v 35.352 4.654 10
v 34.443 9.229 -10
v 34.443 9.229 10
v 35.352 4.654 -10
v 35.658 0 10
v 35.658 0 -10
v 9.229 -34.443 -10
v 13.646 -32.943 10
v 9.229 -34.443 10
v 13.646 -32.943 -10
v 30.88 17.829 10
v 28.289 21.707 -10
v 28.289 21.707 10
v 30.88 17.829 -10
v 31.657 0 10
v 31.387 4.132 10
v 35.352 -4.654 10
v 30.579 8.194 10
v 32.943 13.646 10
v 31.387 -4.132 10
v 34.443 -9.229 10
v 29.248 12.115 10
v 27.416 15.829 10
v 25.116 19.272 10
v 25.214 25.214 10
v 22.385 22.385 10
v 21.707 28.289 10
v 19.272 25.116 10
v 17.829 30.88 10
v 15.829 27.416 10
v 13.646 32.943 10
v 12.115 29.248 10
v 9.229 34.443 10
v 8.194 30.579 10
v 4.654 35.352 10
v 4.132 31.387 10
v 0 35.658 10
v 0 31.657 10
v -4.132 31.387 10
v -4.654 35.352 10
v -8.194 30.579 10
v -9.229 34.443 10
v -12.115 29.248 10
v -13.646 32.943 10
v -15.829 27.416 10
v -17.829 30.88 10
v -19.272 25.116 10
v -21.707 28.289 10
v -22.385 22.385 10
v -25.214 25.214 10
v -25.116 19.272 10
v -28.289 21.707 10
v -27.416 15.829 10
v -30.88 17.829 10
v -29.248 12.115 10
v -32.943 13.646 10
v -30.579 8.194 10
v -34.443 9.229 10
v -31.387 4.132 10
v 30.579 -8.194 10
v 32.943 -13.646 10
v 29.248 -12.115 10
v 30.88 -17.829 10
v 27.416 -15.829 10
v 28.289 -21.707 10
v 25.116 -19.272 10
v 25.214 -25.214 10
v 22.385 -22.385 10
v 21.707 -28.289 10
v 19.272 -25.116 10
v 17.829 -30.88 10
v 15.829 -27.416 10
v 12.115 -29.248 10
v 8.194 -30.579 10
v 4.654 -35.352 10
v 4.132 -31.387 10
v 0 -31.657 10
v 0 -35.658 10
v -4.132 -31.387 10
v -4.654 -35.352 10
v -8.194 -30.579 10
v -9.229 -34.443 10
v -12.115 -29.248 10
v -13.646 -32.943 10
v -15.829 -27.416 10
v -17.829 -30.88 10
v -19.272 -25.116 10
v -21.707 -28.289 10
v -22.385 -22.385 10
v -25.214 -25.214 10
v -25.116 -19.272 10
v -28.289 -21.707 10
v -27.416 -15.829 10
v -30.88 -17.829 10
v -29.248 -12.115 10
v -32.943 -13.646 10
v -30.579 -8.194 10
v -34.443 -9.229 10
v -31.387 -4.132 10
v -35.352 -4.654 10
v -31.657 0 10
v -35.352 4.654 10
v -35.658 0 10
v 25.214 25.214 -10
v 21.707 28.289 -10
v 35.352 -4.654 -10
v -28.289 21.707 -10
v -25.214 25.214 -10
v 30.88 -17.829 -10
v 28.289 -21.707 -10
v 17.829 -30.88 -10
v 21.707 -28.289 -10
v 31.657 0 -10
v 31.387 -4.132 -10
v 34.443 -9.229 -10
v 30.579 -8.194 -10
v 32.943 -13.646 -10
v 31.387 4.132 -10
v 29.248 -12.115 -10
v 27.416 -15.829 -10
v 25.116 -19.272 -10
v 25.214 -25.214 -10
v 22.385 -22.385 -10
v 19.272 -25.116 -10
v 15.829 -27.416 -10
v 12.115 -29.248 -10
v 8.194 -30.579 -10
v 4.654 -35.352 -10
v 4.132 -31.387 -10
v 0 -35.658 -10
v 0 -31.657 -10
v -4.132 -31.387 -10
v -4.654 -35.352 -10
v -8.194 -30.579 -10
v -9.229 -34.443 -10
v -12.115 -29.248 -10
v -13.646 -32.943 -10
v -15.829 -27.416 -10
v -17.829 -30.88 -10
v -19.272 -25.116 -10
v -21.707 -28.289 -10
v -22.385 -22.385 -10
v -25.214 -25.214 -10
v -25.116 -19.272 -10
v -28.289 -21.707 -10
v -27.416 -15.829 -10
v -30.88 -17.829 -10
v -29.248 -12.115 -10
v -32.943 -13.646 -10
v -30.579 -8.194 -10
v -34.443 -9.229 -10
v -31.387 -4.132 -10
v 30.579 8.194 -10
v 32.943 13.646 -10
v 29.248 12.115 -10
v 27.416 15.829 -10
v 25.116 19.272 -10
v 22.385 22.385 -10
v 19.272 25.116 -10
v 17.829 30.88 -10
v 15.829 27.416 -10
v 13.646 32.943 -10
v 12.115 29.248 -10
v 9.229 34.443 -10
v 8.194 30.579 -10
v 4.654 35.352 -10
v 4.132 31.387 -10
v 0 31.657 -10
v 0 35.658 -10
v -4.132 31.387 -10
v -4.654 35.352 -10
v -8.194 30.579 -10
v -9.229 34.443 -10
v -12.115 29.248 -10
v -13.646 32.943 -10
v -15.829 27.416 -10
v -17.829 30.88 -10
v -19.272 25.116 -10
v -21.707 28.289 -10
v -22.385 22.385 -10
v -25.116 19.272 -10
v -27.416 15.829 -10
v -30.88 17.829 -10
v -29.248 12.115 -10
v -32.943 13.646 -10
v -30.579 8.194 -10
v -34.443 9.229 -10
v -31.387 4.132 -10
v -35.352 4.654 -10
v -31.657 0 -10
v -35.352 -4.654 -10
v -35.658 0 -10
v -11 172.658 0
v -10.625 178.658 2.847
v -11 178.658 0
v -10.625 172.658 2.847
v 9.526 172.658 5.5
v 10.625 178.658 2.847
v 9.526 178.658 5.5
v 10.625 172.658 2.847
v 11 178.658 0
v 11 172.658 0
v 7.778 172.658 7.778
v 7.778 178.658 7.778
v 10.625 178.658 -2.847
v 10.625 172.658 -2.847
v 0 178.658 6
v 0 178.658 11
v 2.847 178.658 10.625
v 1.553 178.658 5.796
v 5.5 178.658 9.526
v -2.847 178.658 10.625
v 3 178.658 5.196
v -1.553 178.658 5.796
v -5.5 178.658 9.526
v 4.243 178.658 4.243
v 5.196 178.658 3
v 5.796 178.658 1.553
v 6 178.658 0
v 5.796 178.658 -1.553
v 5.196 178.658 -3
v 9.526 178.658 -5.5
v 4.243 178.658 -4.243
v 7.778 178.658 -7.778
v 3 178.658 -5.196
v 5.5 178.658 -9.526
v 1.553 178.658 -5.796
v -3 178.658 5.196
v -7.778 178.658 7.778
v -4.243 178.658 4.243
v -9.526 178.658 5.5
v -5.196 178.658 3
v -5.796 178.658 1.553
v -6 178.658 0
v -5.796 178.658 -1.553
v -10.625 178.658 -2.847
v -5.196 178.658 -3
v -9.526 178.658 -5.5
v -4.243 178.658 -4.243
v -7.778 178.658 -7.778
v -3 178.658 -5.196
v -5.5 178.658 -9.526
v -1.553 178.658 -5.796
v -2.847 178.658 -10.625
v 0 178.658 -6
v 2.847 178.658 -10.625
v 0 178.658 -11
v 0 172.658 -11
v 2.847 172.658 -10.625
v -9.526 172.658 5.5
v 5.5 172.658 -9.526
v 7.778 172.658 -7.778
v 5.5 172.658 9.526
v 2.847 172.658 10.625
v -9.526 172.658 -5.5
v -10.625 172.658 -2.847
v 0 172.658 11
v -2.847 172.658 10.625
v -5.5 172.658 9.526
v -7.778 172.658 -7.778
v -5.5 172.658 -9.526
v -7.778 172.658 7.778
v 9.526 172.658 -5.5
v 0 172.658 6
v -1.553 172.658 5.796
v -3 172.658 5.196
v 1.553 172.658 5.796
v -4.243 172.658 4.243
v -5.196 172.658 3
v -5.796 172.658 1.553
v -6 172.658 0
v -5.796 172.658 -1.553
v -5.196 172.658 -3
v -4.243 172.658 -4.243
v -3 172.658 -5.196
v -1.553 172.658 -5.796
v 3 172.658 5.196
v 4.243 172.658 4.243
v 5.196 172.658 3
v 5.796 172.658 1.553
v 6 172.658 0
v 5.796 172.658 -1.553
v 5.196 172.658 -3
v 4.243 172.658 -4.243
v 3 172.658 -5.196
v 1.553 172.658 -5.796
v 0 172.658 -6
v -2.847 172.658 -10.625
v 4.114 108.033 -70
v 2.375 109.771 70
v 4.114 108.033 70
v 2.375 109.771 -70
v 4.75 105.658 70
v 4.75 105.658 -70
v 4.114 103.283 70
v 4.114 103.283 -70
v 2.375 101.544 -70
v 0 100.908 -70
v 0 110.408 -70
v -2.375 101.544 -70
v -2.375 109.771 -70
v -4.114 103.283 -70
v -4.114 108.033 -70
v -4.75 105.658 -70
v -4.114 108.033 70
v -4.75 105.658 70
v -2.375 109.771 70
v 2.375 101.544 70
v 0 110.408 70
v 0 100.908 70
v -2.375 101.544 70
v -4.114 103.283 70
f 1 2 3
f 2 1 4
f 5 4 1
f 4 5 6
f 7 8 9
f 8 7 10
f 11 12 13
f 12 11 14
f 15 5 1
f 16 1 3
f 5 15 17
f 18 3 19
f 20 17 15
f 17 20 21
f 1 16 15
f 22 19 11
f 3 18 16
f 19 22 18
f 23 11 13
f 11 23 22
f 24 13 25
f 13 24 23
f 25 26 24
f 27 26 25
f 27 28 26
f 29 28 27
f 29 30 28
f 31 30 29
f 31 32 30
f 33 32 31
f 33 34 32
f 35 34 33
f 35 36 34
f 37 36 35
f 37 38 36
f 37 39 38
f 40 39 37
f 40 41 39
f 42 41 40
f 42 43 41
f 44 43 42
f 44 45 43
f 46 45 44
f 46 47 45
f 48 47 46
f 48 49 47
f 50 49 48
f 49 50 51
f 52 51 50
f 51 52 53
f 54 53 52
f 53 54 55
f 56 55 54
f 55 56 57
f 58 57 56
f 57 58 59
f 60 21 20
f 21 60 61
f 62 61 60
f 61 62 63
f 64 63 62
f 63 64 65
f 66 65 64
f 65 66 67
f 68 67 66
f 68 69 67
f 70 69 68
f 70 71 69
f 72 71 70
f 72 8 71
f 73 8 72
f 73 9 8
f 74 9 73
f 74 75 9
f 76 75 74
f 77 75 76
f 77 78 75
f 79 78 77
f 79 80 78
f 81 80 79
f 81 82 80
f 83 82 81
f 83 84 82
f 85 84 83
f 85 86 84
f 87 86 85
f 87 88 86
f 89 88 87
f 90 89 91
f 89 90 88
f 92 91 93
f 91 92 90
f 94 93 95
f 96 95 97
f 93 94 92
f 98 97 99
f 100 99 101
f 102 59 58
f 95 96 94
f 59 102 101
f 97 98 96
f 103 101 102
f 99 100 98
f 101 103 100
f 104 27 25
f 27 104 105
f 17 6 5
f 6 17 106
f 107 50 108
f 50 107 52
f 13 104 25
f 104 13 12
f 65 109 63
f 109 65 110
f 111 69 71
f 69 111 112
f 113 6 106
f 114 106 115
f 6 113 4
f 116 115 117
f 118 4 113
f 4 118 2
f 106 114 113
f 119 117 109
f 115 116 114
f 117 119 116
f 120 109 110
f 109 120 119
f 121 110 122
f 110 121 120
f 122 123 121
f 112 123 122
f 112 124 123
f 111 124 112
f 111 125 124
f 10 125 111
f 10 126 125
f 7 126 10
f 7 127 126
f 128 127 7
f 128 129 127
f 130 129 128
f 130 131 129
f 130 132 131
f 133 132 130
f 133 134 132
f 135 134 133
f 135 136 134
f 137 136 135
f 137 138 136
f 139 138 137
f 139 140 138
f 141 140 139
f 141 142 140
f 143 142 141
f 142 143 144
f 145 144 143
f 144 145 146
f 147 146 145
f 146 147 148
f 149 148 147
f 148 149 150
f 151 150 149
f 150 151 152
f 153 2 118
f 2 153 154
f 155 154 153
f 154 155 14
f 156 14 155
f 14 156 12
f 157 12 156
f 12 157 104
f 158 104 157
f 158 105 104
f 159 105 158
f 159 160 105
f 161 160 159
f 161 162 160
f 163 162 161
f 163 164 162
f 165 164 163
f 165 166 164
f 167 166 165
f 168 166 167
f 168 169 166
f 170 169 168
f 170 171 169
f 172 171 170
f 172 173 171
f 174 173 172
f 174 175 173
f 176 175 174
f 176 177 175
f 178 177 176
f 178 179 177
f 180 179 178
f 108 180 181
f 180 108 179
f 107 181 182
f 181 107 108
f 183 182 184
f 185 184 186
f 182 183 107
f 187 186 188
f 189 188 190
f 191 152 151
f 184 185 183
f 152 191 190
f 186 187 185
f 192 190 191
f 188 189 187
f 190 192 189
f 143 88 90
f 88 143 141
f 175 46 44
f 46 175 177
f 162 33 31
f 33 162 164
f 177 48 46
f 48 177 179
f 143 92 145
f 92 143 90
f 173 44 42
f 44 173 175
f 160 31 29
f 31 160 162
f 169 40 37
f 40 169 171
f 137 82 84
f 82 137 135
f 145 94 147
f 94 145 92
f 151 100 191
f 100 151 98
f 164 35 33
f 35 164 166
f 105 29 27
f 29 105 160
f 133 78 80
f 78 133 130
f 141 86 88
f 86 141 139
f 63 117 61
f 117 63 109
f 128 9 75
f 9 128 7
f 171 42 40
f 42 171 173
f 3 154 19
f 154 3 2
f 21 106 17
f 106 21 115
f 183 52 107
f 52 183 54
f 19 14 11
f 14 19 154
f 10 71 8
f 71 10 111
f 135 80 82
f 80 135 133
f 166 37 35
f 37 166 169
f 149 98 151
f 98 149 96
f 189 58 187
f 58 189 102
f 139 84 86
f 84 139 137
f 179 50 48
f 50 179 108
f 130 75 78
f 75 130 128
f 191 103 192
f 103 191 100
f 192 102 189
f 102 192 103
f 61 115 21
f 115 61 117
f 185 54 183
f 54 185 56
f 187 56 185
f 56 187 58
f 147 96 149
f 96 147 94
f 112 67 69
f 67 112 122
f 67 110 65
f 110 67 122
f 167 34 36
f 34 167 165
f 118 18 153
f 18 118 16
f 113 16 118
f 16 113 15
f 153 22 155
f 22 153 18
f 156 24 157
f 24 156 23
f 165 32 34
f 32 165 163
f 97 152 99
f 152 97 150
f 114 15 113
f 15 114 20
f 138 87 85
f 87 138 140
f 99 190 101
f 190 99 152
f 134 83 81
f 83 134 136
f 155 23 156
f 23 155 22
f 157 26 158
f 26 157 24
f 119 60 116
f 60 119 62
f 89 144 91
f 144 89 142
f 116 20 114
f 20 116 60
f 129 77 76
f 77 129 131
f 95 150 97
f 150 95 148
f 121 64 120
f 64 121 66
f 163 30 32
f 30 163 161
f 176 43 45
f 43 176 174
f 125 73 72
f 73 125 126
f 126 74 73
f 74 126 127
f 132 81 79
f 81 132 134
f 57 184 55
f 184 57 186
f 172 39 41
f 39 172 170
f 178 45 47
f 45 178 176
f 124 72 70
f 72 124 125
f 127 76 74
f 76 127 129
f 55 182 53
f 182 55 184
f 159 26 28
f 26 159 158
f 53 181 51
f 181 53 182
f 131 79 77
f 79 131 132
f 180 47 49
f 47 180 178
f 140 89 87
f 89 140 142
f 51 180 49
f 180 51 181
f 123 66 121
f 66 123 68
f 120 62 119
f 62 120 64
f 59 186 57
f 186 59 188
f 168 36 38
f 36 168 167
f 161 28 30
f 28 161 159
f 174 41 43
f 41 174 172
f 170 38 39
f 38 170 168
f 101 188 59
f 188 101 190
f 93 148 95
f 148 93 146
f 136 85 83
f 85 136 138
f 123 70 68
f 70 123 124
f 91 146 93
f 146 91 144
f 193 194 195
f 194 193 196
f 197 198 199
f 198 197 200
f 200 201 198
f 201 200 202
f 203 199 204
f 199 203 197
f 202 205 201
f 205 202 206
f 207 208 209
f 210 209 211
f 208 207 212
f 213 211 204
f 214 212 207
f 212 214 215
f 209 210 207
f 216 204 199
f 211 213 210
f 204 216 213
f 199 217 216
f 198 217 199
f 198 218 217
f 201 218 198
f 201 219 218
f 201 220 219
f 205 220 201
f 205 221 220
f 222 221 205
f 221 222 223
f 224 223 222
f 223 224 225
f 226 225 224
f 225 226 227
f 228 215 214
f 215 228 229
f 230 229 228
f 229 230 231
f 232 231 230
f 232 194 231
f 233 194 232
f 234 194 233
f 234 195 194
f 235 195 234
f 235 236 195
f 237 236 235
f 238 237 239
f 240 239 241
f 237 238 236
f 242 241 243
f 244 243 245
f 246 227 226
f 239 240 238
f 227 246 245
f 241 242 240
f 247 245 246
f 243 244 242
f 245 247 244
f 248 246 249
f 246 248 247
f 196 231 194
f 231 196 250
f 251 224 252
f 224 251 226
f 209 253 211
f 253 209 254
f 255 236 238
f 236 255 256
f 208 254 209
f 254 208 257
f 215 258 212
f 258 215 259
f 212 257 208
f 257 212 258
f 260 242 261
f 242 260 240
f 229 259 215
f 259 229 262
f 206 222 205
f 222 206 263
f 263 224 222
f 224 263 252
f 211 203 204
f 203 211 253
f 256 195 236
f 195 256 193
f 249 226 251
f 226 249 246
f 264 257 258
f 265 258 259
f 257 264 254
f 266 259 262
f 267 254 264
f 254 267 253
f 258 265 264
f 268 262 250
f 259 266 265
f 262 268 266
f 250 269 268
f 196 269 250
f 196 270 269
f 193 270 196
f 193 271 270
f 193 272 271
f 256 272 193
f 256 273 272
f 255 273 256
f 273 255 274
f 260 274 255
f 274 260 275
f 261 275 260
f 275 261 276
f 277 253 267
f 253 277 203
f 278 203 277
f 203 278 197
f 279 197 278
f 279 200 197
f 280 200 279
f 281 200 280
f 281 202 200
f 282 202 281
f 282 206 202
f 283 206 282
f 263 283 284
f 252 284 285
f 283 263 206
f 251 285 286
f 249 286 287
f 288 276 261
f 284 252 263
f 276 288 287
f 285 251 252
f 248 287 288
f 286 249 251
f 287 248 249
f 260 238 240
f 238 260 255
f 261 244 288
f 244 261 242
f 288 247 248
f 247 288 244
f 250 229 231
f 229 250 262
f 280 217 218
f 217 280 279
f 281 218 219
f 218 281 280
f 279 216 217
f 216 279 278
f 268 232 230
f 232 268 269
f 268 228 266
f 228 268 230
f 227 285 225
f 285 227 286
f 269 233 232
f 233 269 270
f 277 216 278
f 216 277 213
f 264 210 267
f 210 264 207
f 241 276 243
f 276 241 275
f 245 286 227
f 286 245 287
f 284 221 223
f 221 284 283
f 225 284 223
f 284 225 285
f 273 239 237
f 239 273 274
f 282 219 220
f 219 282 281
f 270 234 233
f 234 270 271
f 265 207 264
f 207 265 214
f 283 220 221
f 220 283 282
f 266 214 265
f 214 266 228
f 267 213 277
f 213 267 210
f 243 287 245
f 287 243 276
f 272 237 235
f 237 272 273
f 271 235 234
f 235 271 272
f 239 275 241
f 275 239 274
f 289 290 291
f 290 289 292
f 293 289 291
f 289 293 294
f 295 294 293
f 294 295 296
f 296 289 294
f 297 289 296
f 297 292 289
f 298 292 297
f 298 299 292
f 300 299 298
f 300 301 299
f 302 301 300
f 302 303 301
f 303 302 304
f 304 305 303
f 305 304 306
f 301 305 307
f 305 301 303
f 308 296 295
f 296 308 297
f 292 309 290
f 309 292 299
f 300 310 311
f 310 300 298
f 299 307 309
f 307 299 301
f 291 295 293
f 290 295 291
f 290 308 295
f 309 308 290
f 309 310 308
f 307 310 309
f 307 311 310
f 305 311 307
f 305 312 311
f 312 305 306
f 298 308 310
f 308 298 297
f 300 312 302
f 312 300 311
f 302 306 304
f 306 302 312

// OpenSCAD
// Auto-generated by scripts/author_from_manifest.py (Phase D.3).
// Source: data/phase_d_manifest.json (sku_intent='tolco-fig1-clevis-hanger-2in').
// Do not hand-edit — regenerate from the manifest.
//
// @part tolco_fig1_clevis_hanger_2in
// @kind hanger
// @category hanger.clevis
// @display-name "Tolco FIG 1 Clevis Hanger 2\""
// @mfg nvent_tolco
// @mfg-pn FIG_1_2in
// @listing UL
// @price-usd 6.25
// @install-minutes 4
// @crew journeyman
// @param size_in number default=2 label="Size" unit="in"
// @port pipe position=[0,0,0] direction=[0,1,0] style=grooved size_in=2 role=run_a

size_in = 2.0;

function od_mm(nps) =
    nps ==   1  ? 33.4 :
    nps == 1.25 ? 42.2 :
    nps == 1.5  ? 48.3 :
    nps ==   2  ? 60.3 :
    nps == 2.5  ? 73.0 :
    nps ==   3  ? 88.9 :
    nps ==   4  ? 114.3 :
    nps ==   6  ? 168.3 :
    nps ==   8  ? 219.1 : 60.3;

od = od_mm(size_in);
ring_id = od * 1.05;
ring_od = ring_id + 8;
strap_w = 20;
rod_len = 140;

union() {
    // Ring
    difference() {
        cylinder(h = strap_w, d = ring_od, center = true, $fn = 48);
        cylinder(h = strap_w + 1, d = ring_id, center = true, $fn = 48);
    }
    // Rod up +Y
    translate([0, rod_len/2 + ring_od/2, 0])
        cylinder(h = rod_len, d = 9.5, center = true, $fn = 12);
    // Top swivel eye
    translate([0, rod_len + ring_od/2, 0])
        rotate([90, 0, 0])
        difference() {
            cylinder(h = 6, d = 22, center = true, $fn = 24);
            cylinder(h = 8, d = 12, center = true, $fn = 24);
        }
}
